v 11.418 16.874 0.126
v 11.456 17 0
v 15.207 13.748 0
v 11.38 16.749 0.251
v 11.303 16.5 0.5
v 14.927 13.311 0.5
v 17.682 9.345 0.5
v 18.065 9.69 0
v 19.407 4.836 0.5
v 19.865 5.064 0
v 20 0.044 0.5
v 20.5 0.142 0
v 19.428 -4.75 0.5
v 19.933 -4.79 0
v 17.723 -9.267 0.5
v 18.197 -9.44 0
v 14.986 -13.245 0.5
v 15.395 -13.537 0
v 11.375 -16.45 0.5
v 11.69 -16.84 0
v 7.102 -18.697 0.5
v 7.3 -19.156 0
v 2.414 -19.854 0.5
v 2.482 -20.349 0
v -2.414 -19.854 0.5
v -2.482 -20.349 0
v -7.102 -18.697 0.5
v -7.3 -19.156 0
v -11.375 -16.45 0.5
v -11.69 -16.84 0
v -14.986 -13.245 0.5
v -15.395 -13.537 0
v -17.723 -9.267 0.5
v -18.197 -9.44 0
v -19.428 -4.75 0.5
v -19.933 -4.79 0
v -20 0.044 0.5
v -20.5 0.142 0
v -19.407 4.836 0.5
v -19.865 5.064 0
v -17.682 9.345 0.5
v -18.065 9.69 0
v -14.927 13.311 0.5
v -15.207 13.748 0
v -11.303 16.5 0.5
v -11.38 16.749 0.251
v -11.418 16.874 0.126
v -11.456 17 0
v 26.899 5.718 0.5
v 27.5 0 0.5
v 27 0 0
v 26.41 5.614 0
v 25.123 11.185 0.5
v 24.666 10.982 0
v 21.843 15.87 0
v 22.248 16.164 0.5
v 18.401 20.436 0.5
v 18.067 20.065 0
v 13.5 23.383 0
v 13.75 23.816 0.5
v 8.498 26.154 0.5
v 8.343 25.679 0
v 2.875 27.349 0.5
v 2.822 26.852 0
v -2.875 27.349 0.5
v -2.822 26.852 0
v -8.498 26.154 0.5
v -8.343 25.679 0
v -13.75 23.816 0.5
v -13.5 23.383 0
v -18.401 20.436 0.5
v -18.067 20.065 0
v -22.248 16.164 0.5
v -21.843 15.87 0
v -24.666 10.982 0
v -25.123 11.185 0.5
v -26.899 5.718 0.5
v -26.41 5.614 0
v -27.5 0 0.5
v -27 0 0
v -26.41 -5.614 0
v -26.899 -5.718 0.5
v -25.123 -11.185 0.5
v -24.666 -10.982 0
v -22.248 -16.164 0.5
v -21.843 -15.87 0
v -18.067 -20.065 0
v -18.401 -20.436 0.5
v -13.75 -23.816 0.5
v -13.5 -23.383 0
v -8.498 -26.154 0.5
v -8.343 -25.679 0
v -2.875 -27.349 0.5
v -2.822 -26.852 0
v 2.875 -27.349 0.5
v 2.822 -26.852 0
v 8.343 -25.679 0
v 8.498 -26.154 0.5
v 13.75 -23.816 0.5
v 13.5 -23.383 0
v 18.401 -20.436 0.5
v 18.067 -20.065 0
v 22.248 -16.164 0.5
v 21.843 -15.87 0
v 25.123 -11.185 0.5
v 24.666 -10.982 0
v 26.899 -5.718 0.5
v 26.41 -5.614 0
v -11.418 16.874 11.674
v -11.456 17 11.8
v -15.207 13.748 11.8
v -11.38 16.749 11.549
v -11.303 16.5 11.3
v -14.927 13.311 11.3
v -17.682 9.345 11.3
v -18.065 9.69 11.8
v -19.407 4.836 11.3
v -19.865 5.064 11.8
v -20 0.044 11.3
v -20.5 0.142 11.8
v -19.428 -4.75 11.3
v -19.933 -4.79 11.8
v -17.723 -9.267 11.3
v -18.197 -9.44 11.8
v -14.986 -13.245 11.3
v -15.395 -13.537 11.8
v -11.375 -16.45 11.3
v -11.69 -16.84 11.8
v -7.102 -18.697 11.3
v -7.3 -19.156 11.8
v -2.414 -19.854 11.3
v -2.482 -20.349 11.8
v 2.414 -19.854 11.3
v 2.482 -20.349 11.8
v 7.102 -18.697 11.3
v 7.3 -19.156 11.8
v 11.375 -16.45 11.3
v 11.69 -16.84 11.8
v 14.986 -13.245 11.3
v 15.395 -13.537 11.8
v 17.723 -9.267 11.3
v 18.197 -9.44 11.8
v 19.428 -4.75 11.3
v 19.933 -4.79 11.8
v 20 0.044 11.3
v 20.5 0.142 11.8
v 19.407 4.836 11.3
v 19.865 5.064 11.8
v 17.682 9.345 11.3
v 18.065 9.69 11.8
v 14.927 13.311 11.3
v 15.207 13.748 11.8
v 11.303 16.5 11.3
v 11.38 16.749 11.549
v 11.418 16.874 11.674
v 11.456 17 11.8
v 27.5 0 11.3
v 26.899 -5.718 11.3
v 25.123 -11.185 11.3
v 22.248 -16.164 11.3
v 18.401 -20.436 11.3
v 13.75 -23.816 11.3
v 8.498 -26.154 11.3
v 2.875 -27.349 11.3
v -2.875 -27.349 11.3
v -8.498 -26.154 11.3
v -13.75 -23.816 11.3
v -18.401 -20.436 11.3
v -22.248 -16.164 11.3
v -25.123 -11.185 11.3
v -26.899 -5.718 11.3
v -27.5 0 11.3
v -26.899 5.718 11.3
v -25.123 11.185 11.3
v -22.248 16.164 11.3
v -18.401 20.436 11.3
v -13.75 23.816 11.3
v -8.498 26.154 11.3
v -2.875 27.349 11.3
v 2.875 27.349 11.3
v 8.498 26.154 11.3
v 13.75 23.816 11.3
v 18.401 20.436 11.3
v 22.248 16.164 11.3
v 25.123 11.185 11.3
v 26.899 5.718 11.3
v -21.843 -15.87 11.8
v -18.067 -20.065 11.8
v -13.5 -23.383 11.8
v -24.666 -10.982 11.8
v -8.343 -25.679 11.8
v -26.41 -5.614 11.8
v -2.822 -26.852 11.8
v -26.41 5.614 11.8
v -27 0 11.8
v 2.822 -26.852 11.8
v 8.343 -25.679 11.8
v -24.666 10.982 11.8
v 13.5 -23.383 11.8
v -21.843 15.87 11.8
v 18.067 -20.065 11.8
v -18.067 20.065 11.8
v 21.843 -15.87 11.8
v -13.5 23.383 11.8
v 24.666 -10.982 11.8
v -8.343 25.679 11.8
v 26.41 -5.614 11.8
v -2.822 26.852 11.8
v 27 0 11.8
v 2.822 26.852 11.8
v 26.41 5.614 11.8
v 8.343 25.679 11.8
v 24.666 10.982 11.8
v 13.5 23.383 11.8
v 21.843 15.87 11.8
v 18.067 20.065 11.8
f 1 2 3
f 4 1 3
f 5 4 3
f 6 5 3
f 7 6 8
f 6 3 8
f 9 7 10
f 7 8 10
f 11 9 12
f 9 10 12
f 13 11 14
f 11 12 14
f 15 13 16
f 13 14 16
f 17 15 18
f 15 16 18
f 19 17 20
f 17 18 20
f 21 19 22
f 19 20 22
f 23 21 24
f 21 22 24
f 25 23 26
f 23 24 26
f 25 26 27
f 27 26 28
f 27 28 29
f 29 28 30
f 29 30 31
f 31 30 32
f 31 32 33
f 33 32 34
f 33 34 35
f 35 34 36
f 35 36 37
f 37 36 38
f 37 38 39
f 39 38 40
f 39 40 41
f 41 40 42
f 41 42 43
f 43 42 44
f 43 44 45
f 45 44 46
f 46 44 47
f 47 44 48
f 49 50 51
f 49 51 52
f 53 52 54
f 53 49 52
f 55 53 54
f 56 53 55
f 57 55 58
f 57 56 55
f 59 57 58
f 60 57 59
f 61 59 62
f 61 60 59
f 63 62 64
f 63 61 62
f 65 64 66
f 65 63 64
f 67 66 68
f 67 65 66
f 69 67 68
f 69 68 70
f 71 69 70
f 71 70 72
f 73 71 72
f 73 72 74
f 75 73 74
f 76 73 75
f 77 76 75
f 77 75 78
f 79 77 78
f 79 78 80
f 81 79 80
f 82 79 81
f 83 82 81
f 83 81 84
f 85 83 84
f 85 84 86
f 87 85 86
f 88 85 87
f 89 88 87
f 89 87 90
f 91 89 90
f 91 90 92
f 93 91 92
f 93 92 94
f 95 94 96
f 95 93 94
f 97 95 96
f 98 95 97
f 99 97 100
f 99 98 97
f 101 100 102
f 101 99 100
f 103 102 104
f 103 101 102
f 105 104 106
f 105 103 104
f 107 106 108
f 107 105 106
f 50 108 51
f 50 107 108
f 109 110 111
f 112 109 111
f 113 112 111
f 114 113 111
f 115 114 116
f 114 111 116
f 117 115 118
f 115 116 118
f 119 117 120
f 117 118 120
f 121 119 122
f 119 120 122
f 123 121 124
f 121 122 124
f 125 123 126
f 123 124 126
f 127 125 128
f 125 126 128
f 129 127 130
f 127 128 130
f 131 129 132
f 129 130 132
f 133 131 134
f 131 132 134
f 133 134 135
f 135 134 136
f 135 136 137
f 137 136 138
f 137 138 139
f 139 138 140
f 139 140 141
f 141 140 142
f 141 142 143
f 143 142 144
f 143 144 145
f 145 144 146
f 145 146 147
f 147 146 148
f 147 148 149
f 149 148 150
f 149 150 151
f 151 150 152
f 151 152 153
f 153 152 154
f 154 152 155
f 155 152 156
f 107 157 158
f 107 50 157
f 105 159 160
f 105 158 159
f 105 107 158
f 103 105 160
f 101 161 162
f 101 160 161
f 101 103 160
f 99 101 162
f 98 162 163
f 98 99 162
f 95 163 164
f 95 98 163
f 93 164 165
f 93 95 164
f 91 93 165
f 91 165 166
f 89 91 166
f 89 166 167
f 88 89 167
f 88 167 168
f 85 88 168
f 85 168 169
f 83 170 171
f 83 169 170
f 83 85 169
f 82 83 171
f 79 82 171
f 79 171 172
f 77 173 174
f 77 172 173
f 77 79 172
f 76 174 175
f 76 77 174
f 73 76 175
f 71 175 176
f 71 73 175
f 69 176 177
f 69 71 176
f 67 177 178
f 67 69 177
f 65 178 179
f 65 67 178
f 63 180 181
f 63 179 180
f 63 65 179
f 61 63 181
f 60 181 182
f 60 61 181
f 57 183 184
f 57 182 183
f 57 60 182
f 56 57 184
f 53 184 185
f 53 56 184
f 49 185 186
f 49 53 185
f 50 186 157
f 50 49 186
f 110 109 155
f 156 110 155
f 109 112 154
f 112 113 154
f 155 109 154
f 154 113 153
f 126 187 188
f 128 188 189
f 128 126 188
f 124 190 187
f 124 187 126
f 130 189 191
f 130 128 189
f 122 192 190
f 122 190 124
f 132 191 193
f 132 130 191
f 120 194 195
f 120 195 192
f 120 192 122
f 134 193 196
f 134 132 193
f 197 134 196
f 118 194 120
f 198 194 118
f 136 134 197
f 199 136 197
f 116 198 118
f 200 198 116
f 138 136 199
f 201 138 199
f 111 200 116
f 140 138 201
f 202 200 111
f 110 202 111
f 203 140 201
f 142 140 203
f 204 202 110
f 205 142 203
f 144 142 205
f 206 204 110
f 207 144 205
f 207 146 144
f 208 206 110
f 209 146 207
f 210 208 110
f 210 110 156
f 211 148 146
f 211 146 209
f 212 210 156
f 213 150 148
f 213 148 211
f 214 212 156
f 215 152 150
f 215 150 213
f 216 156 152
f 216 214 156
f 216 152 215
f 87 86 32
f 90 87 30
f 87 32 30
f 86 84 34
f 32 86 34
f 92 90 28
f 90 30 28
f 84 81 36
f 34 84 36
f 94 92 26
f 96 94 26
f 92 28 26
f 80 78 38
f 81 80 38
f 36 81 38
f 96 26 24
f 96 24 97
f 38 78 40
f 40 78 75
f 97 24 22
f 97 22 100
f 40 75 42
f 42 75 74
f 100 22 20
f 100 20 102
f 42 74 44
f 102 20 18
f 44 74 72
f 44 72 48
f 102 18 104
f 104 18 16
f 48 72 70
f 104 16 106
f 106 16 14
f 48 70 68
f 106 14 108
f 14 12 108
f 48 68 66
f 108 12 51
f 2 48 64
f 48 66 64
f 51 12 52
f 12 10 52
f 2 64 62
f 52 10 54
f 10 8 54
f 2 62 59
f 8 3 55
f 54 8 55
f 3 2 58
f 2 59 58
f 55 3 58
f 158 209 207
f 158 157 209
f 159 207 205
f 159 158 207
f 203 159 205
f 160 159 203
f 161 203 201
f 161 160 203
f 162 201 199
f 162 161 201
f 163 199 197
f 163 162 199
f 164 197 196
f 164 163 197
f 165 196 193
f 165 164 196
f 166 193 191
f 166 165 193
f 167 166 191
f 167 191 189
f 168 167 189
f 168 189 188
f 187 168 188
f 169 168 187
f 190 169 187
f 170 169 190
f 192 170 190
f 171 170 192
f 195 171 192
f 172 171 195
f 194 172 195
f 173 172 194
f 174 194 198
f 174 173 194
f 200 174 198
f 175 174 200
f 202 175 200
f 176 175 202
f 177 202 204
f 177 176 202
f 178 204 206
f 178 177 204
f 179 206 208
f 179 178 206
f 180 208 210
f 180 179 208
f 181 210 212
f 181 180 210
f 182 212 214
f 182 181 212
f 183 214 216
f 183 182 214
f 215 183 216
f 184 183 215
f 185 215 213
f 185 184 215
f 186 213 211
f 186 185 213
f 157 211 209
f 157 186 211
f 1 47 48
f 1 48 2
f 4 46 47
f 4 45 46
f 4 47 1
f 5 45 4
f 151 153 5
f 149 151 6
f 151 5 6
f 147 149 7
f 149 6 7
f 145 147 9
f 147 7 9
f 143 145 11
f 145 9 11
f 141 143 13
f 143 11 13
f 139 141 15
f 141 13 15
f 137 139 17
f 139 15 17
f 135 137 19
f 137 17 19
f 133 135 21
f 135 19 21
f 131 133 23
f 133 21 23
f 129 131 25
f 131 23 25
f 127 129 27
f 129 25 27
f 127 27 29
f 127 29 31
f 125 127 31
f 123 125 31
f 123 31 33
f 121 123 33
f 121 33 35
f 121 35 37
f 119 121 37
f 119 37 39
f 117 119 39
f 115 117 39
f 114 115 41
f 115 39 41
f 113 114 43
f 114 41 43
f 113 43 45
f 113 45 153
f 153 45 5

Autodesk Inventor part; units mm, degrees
ref_plane "YZ Plane" through (0, 0, 0) normal (1, 0, 0) x (0, 1, 0)
ref_plane "XZ Plane" through (0, 0, 0) normal (0, 1, 0) x (-1, 0, 0)
ref_plane "XY Plane" through (0, 0, 0) normal (0, 0, 1) x (1, 0, 0)
sketch "Skizze1" plane through (0, 0, 0) normal (0, 0, 1) x (1, 0, 0)
  circle A0 centre (0, 0) radius 27.5
  circle A1 centre (0, 0) radius 20
  line L0 (-6, 19.0788) -> (-6, 22.8)
  line L1 (-6, 22.8) -> (6, 22.8)
  line L2 (6, 22.8) -> (6, 19.0788)
  line L3 (0, -38.5) -> (0, 38.5) construction
  line L4 (-6, 20) -> (6, 20) construction
  line L5 (-11.3027, 16.5) -> (11.3027, 16.5)
  point P0 (0, 22.8)
  point P1 (0, 20)
  dimension "d0" = 2.8
  dimension "d1" = 12
  dimension "d2" = 40
  dimension "d3" = 55
  dimension "d9" = 3.5
extrude "Extrusion1" add sketch "Skizze1" along normal blind 11.8 contours A0 | L5 A1 | A1 L0 L1 L2 picked at (0.6759, 18.8958)
chamfer "Fase1" distance 0.5 angle 45 6 edges at (-27.5, 0, 11.8) (-27.5, 0, 0) (0, -20, 11.8) (0, 16.5, 11.8) (0, -20, 0) (0, 16.5, 0)
equation "\"d0\" = Nabennuttiefe_20"
equation "\"d1\" = Passfeder_width"
equation "\"d2\" = 2 * Shaft_CapstonPart_Dia"
equation "\"Shaft_CapstonPart_Length\" = 22.8"
equation "\"Nabennuttiefe_20\" = 2.8"
equation "\"Passfeder_width\" = 12"
equation "\"Shaft_CapstonPart_Dia\" = 20"
properties part number "Capston_Distanzscheibe_10mm" material "Edelstahl"
